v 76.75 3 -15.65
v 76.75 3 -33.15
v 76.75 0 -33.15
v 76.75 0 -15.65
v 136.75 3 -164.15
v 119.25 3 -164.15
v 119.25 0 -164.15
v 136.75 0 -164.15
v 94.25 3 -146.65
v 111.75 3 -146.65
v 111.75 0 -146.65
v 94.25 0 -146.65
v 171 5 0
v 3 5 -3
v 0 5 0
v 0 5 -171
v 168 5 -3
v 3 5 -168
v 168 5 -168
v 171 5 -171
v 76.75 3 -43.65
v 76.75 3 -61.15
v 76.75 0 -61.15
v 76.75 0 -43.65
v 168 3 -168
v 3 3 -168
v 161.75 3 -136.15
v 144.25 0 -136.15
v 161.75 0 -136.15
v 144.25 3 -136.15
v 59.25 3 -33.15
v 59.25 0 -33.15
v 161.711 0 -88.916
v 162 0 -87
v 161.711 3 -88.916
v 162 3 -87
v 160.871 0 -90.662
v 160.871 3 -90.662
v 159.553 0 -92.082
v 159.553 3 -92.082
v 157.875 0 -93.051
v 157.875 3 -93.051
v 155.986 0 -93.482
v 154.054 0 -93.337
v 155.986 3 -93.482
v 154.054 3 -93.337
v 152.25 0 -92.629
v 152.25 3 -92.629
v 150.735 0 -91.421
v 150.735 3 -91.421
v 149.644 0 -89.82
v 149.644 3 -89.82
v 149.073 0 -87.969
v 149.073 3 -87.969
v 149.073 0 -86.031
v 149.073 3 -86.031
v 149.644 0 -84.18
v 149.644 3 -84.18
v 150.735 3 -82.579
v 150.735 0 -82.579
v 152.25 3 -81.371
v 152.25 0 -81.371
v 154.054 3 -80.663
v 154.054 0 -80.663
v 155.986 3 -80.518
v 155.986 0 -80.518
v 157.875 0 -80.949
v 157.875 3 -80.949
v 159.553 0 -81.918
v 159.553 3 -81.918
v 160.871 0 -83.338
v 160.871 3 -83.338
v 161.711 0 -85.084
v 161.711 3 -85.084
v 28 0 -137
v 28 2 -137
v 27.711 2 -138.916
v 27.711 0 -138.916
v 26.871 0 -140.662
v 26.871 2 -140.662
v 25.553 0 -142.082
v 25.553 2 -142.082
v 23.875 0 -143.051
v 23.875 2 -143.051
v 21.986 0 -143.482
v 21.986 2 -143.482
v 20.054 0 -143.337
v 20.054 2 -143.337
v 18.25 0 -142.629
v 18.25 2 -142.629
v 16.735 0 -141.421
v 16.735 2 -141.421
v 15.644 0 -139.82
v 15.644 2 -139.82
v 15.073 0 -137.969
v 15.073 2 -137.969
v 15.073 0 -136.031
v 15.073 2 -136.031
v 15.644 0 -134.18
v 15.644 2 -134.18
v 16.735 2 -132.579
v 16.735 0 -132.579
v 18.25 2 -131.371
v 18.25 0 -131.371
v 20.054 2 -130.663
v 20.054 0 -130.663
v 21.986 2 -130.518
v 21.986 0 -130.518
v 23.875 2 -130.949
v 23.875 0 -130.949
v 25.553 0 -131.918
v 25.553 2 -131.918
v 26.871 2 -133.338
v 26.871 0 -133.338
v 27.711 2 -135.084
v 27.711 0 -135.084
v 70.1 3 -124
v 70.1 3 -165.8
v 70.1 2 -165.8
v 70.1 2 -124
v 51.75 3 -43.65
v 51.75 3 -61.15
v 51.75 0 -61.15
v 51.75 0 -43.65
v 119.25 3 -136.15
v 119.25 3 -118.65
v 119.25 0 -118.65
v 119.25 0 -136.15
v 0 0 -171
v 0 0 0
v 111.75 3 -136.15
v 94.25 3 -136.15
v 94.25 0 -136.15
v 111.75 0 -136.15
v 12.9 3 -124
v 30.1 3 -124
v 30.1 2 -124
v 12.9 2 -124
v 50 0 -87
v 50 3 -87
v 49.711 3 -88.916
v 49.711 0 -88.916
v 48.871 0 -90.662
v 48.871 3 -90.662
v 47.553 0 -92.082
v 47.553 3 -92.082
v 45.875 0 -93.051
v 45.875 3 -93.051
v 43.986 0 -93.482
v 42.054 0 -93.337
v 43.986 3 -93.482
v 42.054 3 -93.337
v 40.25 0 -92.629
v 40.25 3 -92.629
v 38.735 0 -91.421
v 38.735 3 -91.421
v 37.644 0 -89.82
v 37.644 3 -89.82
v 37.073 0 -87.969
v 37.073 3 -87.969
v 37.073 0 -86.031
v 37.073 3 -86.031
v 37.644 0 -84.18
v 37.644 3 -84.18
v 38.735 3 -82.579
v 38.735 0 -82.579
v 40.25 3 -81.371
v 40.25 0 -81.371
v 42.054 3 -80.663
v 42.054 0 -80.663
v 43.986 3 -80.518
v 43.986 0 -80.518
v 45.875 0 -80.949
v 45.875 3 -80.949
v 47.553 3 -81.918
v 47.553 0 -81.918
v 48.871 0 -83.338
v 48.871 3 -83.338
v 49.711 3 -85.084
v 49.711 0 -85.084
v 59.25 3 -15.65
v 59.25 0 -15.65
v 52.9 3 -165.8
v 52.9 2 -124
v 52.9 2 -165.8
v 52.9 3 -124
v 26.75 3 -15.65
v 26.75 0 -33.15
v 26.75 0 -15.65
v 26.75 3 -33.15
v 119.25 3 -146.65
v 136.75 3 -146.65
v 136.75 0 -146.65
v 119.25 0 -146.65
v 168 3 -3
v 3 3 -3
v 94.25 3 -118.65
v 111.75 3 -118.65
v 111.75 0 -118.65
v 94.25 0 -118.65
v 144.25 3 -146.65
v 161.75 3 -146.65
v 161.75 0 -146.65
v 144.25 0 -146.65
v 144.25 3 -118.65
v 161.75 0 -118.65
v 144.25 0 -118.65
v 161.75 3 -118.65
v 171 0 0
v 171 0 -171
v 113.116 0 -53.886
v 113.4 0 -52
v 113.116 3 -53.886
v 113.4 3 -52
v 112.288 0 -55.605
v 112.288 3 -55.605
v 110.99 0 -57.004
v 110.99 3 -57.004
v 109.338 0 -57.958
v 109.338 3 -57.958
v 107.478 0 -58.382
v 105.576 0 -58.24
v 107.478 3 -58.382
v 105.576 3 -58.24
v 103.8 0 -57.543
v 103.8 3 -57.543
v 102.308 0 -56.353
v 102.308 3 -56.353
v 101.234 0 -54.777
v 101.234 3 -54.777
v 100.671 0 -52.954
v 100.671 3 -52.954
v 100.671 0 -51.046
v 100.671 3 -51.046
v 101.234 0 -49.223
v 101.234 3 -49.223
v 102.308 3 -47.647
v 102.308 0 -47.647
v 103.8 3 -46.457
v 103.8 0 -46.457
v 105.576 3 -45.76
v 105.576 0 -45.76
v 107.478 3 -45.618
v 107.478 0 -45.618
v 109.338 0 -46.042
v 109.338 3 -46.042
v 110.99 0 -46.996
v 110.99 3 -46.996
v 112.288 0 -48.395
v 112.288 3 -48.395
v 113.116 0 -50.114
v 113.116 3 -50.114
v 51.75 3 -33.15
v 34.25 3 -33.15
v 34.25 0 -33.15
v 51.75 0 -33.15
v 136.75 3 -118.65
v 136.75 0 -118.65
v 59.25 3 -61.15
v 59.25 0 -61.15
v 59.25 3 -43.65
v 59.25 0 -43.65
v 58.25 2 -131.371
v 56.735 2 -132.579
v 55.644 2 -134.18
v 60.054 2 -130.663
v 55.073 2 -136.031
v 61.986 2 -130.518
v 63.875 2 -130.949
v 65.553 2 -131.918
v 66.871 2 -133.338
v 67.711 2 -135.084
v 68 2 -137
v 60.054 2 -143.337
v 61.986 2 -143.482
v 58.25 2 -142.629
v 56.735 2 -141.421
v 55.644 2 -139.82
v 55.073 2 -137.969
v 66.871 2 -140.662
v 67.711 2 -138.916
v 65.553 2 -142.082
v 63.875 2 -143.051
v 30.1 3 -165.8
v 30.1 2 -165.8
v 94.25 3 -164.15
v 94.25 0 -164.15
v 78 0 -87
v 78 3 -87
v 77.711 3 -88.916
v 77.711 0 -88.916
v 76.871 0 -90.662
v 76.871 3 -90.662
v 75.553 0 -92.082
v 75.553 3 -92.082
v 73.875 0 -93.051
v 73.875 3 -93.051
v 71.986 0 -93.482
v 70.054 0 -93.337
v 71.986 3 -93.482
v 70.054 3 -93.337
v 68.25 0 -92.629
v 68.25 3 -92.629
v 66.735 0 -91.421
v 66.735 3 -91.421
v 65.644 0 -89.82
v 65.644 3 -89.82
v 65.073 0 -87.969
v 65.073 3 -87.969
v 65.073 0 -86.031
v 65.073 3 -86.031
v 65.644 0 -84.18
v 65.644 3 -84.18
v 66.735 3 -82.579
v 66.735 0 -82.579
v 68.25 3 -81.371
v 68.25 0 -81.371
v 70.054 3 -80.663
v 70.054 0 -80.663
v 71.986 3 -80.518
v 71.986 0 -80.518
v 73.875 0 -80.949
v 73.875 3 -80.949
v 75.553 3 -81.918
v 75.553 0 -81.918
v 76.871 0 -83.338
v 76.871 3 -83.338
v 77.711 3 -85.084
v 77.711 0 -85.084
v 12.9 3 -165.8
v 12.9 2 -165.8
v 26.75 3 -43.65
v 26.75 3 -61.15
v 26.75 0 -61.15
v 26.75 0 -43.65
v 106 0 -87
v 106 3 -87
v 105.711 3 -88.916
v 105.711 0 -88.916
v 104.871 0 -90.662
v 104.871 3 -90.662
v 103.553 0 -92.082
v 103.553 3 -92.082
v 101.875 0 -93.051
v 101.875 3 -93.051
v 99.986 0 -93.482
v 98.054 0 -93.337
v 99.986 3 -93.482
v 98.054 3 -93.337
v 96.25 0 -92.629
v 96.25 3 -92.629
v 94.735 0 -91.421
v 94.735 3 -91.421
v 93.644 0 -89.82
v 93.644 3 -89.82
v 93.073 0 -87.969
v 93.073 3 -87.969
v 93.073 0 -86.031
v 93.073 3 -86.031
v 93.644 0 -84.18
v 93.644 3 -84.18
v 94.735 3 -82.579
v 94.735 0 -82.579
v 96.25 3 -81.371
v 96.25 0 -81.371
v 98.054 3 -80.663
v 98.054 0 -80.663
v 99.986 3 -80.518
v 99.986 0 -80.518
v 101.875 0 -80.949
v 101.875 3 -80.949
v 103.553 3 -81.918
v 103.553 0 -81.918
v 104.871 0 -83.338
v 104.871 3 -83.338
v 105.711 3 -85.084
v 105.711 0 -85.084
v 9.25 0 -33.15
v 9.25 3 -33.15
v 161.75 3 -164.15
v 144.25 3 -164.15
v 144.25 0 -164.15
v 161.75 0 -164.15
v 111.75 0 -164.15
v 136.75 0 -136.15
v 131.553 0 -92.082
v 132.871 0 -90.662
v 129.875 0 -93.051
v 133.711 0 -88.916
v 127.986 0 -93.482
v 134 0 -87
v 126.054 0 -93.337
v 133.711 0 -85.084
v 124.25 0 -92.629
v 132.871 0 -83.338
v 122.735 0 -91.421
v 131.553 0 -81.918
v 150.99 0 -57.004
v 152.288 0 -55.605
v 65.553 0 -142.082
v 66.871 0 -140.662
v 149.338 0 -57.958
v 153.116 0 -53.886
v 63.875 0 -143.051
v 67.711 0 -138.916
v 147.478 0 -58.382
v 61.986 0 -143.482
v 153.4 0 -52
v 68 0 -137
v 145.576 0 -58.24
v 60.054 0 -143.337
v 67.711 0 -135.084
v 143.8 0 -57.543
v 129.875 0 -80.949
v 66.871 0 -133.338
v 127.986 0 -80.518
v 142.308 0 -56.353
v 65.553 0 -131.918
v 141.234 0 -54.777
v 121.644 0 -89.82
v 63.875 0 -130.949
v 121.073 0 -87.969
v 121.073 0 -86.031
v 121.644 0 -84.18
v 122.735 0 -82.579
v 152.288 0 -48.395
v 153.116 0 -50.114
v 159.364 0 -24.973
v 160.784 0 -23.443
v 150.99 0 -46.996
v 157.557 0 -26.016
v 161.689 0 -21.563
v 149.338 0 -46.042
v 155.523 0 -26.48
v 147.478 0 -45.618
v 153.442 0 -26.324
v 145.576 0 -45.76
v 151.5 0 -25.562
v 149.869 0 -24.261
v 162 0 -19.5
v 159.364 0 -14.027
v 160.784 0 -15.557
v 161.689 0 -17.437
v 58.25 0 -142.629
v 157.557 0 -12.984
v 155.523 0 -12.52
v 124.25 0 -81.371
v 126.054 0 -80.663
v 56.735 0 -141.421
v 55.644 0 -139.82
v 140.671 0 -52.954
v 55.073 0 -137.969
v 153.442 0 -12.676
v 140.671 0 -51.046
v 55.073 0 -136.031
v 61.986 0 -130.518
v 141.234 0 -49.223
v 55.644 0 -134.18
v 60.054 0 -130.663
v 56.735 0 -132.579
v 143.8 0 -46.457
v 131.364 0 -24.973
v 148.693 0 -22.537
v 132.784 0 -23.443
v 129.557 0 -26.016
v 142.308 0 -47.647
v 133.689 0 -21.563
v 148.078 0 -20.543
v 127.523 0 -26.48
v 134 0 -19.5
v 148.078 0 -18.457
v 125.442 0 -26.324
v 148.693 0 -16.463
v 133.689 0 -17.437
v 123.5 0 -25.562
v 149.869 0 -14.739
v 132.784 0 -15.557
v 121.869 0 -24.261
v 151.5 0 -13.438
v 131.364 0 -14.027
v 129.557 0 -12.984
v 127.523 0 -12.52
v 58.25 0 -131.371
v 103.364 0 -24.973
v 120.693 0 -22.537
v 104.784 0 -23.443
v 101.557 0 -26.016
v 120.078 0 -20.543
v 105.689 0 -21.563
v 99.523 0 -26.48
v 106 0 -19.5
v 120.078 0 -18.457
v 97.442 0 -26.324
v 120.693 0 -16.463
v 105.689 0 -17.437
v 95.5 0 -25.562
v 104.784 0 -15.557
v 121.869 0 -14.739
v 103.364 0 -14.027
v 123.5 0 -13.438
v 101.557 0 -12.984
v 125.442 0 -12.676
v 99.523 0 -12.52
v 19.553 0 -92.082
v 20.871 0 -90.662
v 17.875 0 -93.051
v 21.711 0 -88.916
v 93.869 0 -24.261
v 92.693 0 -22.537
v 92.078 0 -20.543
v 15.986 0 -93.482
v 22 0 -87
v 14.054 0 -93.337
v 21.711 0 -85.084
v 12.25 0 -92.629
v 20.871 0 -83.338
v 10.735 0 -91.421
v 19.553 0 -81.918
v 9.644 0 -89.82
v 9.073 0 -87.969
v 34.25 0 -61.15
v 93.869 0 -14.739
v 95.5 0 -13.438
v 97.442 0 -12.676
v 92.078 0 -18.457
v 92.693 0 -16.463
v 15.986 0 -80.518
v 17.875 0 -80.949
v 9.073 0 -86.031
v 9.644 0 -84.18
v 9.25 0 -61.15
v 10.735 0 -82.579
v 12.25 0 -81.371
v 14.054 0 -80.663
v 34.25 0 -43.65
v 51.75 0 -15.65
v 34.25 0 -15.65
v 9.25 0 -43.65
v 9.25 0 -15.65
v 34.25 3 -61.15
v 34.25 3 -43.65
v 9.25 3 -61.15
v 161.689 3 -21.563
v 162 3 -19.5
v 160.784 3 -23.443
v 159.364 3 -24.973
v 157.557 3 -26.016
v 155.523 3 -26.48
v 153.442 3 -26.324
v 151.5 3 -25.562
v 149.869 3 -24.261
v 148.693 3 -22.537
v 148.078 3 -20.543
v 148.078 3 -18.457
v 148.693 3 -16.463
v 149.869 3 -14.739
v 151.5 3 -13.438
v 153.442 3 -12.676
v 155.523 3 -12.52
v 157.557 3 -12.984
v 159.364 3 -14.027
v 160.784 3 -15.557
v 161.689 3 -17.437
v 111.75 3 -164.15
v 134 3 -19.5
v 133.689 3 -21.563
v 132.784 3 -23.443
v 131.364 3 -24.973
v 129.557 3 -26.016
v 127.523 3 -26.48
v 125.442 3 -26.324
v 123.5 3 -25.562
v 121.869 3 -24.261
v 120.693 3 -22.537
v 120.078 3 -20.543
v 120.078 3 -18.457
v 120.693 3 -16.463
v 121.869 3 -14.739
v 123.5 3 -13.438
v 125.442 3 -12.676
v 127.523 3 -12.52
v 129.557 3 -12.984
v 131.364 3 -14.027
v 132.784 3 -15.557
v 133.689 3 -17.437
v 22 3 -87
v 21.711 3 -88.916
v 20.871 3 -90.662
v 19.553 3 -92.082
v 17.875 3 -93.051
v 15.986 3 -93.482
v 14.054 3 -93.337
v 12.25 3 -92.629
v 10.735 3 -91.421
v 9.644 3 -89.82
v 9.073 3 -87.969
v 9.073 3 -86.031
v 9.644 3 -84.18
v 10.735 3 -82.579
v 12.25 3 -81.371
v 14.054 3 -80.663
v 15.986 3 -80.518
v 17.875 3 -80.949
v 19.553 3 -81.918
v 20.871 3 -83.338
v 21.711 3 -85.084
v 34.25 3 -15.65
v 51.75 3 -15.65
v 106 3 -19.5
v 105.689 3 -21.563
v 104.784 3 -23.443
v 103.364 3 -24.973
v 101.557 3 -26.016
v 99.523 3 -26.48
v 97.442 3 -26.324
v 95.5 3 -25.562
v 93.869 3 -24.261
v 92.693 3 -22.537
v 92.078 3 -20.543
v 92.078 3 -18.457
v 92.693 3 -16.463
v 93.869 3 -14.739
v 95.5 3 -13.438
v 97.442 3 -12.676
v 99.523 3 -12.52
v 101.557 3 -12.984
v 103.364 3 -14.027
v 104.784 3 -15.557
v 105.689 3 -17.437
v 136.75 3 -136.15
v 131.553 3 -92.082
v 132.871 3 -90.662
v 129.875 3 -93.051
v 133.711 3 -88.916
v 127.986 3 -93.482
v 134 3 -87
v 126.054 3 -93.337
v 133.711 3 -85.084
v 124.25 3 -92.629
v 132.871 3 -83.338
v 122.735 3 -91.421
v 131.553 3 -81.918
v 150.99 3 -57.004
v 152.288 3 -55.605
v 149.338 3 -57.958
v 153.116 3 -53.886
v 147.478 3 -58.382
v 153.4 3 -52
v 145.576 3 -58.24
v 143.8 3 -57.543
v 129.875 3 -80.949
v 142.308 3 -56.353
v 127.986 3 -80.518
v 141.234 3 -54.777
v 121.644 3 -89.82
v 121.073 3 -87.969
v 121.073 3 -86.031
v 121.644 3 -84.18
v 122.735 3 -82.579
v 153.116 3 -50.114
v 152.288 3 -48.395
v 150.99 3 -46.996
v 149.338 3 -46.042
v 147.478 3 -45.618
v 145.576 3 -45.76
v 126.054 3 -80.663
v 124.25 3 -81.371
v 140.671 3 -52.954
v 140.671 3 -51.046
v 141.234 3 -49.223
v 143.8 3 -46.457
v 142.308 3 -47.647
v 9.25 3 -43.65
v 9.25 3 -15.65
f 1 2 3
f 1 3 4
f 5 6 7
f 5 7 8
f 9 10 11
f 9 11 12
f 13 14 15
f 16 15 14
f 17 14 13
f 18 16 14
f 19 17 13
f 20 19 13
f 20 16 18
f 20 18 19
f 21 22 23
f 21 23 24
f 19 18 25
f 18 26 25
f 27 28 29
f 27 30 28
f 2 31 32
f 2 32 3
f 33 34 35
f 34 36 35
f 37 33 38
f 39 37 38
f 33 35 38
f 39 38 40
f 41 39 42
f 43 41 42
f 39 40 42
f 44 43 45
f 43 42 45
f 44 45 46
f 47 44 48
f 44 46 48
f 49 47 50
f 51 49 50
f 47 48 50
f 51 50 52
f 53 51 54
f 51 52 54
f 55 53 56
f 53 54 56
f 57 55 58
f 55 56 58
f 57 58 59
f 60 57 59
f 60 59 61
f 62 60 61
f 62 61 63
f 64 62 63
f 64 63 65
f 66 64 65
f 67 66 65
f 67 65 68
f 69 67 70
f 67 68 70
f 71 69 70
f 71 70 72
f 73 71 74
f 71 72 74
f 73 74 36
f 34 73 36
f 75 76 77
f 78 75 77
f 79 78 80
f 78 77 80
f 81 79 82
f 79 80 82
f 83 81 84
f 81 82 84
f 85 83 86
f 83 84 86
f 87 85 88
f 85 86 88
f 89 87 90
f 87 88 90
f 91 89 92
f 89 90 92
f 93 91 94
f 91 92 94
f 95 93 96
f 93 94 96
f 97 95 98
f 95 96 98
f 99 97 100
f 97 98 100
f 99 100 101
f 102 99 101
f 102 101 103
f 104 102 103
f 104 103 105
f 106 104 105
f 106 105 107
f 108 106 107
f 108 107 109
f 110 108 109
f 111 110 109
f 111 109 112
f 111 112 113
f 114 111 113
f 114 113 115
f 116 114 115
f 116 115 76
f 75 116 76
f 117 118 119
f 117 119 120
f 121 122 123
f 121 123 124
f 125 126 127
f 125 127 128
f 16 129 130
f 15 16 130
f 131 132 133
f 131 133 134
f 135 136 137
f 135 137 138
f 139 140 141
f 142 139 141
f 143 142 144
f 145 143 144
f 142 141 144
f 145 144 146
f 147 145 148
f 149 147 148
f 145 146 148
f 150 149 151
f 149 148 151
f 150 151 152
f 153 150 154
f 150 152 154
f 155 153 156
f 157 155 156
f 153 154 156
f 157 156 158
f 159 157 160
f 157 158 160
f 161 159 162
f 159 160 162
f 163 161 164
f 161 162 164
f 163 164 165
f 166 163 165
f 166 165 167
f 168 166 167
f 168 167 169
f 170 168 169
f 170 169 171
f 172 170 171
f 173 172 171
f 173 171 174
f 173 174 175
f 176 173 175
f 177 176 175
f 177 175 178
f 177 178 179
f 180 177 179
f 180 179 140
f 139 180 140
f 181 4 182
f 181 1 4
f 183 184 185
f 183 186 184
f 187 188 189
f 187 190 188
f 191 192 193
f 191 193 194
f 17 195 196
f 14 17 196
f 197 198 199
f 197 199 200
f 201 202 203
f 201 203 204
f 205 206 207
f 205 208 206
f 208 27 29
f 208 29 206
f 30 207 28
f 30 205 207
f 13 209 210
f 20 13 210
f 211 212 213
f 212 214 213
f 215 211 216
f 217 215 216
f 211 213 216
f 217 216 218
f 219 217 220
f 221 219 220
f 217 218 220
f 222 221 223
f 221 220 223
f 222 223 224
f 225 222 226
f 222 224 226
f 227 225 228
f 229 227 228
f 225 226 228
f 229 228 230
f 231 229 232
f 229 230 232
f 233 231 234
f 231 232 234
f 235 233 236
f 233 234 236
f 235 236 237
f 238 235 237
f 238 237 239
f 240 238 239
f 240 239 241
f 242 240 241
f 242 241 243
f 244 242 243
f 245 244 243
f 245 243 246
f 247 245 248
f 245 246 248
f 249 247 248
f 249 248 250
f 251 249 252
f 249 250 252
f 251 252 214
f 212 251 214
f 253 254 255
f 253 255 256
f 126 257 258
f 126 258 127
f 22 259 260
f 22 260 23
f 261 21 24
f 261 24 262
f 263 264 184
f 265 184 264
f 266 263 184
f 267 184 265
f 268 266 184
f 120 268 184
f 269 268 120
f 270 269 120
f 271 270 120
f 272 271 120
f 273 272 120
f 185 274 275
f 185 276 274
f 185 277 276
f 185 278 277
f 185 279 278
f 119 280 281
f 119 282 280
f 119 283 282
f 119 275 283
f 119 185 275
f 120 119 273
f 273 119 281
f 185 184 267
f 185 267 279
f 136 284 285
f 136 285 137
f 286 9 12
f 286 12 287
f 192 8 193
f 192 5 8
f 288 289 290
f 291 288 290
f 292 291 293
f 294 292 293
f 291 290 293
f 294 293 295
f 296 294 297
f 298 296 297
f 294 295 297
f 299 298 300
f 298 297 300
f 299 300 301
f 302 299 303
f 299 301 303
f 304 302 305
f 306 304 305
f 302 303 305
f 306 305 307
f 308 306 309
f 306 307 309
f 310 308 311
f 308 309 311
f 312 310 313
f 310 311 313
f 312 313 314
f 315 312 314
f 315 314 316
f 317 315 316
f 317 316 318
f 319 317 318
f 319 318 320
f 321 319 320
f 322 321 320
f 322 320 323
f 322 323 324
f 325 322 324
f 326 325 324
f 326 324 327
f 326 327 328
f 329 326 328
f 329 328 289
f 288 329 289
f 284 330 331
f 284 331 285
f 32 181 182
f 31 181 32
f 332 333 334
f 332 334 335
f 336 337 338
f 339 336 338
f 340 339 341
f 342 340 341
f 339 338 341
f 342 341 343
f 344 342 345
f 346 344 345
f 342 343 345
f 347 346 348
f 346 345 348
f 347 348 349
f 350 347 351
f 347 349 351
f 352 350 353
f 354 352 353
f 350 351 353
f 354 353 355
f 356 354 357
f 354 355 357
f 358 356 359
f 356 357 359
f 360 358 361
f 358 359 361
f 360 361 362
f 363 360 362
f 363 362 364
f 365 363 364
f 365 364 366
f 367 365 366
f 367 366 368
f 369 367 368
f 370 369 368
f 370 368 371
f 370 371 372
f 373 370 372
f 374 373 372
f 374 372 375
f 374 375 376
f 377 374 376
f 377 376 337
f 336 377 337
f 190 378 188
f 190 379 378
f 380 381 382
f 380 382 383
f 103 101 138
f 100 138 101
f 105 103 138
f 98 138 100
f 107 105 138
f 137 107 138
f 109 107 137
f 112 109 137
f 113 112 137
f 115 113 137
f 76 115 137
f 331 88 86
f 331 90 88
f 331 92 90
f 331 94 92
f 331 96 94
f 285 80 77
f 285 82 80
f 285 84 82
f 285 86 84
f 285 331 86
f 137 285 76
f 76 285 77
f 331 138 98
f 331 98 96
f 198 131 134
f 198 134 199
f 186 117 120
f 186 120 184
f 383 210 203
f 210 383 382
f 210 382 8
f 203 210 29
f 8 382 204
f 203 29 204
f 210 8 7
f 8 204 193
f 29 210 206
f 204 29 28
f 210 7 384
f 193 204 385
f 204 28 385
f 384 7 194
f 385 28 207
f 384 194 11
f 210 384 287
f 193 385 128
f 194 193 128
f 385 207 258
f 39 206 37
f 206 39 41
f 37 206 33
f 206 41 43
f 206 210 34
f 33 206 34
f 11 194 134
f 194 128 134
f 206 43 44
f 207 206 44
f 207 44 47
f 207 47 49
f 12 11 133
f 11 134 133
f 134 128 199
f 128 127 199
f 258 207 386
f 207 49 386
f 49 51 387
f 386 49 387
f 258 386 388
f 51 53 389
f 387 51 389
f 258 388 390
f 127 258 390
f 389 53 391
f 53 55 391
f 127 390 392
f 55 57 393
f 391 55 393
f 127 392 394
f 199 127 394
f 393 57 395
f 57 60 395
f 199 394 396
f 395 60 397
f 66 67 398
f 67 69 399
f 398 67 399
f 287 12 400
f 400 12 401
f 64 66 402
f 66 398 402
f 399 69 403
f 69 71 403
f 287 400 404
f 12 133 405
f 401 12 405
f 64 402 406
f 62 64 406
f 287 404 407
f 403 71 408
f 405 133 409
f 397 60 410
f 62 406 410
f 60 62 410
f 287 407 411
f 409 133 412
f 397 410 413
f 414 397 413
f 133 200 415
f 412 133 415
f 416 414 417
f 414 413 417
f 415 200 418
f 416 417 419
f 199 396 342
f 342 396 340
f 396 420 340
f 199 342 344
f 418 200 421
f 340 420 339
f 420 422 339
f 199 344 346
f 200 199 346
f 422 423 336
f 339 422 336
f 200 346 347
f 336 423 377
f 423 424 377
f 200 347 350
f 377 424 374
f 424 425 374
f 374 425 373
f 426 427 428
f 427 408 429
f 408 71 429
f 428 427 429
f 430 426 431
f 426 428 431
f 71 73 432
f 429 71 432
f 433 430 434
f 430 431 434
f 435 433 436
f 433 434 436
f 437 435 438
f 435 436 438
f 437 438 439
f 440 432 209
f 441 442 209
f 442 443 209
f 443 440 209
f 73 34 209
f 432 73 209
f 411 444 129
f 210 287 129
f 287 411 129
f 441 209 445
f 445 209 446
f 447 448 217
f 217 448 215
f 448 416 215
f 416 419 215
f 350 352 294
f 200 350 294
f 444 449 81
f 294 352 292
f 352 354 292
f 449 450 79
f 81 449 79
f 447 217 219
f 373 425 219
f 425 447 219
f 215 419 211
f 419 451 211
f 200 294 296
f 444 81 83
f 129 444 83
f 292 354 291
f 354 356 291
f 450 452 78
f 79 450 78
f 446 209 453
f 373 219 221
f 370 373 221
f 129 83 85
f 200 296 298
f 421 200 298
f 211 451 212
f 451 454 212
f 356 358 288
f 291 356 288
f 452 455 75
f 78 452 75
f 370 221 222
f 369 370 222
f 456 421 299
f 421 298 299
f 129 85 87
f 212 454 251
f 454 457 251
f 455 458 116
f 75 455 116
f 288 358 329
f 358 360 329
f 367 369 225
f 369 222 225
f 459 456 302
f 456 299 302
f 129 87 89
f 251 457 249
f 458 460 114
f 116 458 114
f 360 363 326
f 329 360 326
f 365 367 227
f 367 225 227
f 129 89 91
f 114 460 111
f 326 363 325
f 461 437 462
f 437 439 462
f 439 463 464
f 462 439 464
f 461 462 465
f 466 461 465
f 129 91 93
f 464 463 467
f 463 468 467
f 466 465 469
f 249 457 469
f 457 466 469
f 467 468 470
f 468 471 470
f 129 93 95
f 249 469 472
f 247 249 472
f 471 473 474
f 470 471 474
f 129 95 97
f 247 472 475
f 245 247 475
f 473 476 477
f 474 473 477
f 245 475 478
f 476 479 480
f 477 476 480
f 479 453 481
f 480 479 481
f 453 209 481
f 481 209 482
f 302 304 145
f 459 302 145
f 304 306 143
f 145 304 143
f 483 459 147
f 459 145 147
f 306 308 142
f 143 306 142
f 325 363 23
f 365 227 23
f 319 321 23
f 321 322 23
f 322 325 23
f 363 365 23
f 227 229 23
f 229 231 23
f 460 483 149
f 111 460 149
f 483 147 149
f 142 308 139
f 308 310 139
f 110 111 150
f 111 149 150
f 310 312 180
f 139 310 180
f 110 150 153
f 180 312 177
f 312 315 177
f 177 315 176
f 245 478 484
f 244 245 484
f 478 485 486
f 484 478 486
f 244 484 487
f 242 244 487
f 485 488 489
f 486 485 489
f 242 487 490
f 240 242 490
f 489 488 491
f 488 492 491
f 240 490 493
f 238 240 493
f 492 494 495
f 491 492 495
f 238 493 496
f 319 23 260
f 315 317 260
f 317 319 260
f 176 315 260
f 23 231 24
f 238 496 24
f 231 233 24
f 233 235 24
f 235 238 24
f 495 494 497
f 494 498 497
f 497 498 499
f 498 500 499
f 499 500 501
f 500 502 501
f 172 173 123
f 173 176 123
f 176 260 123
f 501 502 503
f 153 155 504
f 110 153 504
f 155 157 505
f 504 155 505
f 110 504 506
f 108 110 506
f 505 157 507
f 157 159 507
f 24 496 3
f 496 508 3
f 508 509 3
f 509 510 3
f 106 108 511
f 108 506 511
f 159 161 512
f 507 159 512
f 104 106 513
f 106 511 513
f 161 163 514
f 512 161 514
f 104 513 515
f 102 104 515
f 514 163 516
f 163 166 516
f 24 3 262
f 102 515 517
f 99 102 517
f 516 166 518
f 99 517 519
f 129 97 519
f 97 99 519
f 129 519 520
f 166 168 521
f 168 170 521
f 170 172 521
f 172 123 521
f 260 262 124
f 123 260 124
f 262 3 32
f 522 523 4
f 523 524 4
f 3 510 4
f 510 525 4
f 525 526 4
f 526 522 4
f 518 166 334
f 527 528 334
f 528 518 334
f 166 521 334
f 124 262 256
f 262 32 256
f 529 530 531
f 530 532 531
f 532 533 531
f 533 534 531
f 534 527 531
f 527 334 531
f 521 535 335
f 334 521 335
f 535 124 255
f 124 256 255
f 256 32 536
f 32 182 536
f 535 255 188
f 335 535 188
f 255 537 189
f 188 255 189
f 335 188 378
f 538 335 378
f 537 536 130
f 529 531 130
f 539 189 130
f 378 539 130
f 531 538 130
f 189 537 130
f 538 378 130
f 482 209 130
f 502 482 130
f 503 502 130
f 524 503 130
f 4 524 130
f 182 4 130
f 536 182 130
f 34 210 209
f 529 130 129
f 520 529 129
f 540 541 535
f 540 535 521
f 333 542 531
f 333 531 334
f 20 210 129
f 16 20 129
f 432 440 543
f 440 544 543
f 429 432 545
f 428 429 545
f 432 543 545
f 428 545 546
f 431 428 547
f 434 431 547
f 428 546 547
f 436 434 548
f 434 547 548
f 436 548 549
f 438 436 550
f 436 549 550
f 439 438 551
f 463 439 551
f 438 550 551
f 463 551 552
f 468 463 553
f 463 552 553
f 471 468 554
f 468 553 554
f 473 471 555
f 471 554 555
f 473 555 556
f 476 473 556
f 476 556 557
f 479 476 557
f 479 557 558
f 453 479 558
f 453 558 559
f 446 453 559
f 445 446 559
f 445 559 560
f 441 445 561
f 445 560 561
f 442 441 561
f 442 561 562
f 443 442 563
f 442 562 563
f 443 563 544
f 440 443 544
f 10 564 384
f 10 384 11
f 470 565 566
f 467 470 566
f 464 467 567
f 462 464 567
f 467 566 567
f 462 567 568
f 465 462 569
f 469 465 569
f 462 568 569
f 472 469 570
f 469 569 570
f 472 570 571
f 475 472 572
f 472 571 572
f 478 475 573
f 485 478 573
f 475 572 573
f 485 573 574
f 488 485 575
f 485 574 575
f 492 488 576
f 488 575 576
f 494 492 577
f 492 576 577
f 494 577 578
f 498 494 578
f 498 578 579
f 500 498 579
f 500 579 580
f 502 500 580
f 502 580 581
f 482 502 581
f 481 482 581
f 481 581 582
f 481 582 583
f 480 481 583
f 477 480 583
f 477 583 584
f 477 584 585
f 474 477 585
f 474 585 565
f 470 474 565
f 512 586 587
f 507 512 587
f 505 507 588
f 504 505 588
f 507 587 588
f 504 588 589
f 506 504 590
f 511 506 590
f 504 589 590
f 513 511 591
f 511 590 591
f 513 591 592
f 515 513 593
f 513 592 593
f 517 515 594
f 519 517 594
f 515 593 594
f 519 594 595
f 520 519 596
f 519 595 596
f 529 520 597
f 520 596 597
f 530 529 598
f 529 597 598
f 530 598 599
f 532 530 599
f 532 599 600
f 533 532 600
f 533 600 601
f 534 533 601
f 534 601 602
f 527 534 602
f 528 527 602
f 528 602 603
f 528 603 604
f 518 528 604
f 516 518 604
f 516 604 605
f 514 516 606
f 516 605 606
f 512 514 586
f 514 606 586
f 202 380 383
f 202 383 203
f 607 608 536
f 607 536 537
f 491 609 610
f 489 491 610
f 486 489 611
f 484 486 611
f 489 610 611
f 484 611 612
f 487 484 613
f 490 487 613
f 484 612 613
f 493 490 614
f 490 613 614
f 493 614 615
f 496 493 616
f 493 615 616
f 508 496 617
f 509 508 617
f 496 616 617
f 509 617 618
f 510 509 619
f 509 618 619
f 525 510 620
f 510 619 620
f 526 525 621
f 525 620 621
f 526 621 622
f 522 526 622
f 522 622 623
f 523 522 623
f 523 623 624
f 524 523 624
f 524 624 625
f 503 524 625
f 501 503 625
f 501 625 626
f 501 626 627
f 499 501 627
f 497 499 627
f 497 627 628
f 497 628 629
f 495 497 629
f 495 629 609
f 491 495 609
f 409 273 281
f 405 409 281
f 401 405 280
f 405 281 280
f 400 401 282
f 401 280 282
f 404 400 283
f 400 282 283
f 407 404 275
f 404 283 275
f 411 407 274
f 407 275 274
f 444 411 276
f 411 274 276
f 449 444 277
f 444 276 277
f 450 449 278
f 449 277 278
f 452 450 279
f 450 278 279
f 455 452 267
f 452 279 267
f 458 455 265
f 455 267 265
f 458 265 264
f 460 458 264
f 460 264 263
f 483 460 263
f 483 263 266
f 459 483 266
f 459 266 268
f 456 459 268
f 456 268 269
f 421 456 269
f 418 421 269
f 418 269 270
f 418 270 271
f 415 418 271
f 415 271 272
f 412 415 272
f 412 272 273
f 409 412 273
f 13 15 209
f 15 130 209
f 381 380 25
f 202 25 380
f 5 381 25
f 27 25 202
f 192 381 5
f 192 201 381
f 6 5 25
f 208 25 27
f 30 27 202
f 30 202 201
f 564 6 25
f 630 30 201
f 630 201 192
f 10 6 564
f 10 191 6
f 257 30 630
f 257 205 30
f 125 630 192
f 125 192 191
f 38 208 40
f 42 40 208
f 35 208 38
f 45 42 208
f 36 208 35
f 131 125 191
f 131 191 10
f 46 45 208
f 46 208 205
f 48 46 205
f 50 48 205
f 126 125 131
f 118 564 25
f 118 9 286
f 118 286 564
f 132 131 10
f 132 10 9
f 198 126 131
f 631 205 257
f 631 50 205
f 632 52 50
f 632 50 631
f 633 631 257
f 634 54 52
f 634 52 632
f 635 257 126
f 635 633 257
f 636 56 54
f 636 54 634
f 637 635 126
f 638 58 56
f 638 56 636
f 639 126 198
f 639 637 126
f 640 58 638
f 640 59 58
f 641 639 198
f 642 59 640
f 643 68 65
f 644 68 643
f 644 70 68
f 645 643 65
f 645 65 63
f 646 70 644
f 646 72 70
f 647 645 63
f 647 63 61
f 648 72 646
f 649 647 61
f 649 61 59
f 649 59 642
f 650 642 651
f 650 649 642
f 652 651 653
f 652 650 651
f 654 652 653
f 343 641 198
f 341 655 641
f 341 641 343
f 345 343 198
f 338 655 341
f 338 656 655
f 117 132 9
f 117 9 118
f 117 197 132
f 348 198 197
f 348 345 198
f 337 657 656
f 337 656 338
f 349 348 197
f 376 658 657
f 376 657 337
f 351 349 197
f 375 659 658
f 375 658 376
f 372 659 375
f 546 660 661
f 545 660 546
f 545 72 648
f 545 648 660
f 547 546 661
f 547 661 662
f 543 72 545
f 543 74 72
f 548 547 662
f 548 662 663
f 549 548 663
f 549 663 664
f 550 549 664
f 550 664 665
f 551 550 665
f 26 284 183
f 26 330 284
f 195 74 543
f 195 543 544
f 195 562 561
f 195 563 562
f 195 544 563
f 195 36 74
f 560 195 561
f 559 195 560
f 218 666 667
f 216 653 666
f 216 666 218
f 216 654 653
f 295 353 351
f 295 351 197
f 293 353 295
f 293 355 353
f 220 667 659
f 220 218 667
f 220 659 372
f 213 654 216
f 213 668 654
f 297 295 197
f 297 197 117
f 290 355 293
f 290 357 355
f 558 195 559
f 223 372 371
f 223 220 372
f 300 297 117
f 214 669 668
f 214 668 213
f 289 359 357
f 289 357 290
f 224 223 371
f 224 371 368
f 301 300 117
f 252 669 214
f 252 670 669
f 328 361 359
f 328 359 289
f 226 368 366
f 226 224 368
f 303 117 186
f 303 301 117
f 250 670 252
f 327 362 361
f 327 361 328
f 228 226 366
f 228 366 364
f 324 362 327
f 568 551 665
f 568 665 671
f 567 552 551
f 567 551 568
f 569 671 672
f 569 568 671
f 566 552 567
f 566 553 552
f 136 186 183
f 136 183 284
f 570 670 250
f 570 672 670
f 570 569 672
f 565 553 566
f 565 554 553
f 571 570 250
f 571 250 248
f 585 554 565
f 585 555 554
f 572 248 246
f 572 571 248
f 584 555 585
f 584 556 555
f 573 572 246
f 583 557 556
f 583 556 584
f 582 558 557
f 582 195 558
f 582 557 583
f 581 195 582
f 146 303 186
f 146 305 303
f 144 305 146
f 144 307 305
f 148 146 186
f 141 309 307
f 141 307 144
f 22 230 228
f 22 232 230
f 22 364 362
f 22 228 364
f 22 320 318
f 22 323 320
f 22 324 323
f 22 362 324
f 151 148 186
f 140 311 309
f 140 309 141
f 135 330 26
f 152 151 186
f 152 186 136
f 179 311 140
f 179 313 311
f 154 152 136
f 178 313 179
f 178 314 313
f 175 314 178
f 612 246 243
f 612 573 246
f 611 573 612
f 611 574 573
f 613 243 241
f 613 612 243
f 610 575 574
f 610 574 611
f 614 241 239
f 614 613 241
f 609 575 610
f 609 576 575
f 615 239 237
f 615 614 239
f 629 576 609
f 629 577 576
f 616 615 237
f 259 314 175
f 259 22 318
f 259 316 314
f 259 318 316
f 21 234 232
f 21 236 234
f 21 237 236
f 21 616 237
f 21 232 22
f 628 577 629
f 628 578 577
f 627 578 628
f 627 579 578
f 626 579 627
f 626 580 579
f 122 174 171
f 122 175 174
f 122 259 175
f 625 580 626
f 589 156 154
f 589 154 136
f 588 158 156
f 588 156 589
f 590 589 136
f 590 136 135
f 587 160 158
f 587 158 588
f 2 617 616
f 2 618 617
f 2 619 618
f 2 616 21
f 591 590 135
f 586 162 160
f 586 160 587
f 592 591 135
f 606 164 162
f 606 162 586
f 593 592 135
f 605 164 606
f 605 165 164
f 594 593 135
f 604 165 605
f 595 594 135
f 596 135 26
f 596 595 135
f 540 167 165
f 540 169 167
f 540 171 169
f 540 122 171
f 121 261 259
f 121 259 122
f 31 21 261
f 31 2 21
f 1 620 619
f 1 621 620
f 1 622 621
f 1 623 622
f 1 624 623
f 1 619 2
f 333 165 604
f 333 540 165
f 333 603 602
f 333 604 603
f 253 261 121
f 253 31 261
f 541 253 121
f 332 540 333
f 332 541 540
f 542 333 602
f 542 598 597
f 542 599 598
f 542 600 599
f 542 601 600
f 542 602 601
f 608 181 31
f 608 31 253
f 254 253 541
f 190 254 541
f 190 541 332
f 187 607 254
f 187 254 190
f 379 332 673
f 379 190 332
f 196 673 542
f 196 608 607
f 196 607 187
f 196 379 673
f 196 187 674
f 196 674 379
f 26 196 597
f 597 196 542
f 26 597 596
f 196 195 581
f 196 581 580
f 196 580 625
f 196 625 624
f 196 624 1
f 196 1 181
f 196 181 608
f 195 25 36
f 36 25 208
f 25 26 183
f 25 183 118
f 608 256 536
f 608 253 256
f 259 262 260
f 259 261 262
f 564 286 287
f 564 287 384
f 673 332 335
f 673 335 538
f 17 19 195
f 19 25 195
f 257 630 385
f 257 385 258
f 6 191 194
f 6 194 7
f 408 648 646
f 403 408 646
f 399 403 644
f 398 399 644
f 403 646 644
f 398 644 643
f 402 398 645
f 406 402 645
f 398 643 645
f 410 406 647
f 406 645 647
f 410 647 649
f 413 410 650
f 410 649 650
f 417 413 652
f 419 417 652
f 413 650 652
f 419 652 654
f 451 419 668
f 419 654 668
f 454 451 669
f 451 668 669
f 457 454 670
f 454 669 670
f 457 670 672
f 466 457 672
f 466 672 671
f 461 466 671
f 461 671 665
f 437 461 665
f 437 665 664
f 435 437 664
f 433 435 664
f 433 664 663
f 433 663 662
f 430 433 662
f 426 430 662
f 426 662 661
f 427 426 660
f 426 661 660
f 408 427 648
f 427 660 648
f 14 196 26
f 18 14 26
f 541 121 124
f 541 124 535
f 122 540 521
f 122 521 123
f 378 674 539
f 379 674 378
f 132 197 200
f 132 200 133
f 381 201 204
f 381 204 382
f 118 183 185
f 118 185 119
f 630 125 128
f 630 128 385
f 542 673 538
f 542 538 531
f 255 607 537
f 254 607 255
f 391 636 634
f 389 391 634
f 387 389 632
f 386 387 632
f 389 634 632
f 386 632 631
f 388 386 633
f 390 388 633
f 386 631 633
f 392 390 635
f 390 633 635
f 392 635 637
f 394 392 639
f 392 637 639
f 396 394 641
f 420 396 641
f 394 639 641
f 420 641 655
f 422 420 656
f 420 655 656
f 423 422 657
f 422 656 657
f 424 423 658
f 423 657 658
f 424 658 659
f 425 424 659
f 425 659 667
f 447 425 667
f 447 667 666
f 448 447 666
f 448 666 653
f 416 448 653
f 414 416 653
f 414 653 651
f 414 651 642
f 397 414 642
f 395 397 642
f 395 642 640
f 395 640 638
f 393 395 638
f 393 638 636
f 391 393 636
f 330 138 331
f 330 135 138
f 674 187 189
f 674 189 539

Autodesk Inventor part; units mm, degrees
ref_plane "YZ Plane" through (0, 0, 0) normal (1, 0, 0) x (0, 1, 0)
ref_plane "XZ Plane" through (0, 0, 0) normal (0, 1, 0) x (-1, 0, 0)
ref_plane "XY Plane" through (0, 0, 0) normal (0, 0, 1) x (1, 0, 0)
sketch "Sketch1" plane through (0, 0, 0) normal (0, 1, 0) x (-1, 0, 0)
  line L0 (0, 0) -> (-171, 0)
  line L1 (-171, 0) -> (-171, -171)
  line L2 (-171, -171) -> (0, -171)
  line L3 (0, -171) -> (0, 0)
  dimension "d0" = 171
  dimension "d1" = 171
extrude "Extrusion1" add sketch "Sketch1" along normal blind 3
sketch "Sketch2" plane through (0, 3, 0) normal (0, 1, 0) x (1, 0, 0)
  line L0 (171, 0) -> (171, 171) projected
  line L1 (171, 171) -> (0, 171) projected
  line L2 (0, 171) -> (0, 0) projected
  line L3 (0, 0) -> (171, 0) projected
  line L4 (3, 3) -> (3, 168)
  line L5 (3, 168) -> (168, 168)
  line L6 (168, 168) -> (168, 3)
  line L7 (168, 3) -> (3, 3)
  dimension "d98" = 165
extrude "Extrusion2" add sketch "Sketch2" along normal blind 2
sketch "Sketch3" plane through (0, 3, 0) normal (0, 1, 0) x (1, 0, 0)
  line L0 (3, 3) -> (168, 3) construction
  line L1 (168, 3) -> (168, 168) construction
  line L2 (168, 168) -> (3, 168) construction
  line L3 (3, 168) -> (3, 3) construction
  line L4 (4, 64) -> (82, 64) construction
  line L5 (82, 64) -> (82, 4) construction
  line L6 (82, 4) -> (4, 4) construction
  line L7 (4, 4) -> (4, 64) construction
  line L8 (89, 107) -> (167, 107) construction
  line L9 (167, 107) -> (167, 167) construction
  line L10 (167, 167) -> (89, 167) construction
  line L11 (89, 167) -> (89, 107) construction
  line L12 (4, 167) -> (79, 167) construction
  line L13 (79, 167) -> (79, 102) construction
  line L14 (4, 72) -> (4, 167) construction
  line L15 (4, 72) -> (167, 72) construction
  line L16 (167, 72) -> (167, 102) construction
  line L17 (167, 102) -> (79, 102) construction
  line L18 (87, 67) -> (167, 67) construction
  line L19 (167, 67) -> (167, 37) construction
  line L20 (167, 37) -> (87, 37) construction
  line L21 (87, 37) -> (87, 67) construction
  line L22 (87, 32) -> (167, 32) construction
  line L23 (167, 32) -> (167, 7) construction
  line L24 (167, 7) -> (87, 7) construction
  line L25 (87, 7) -> (87, 32) construction
  line L26 (9.25, 33.15) -> (26.75, 33.15)
  line L27 (26.75, 33.15) -> (26.75, 15.65)
  line L28 (26.75, 15.65) -> (9.25, 15.65)
  line L29 (9.25, 15.65) -> (9.25, 33.15)
  line L30 (9.25, 61.15) -> (26.75, 61.15)
  line L31 (9.25, 43.65) -> (9.25, 61.15)
  line L32 (26.75, 43.65) -> (9.25, 43.65)
  line L33 (26.75, 61.15) -> (26.75, 43.65)
  line L34 (34.25, 33.15) -> (51.75, 33.15)
  line L35 (34.25, 15.65) -> (34.25, 33.15)
  line L36 (51.75, 15.65) -> (34.25, 15.65)
  line L37 (51.75, 33.15) -> (51.75, 15.65)
  line L38 (34.25, 61.15) -> (51.75, 61.15)
  line L39 (34.25, 43.65) -> (34.25, 61.15)
  line L40 (51.75, 43.65) -> (34.25, 43.65)
  line L41 (51.75, 61.15) -> (51.75, 43.65)
  line L42 (59.25, 33.15) -> (76.75, 33.15)
  line L43 (59.25, 15.65) -> (59.25, 33.15)
  line L44 (76.75, 15.65) -> (59.25, 15.65)
  line L45 (76.75, 33.15) -> (76.75, 15.65)
  line L46 (59.25, 61.15) -> (76.75, 61.15)
  line L47 (59.25, 43.65) -> (59.25, 61.15)
  line L48 (76.75, 43.65) -> (59.25, 43.65)
  line L49 (76.75, 61.15) -> (76.75, 43.65)
  line L50 (9.25, 61.15) -> (9.25, 15.65) construction
  line L51 (9.25, 61.15) -> (76.75, 61.15) construction
  line L52 (94.25, 136.15) -> (111.75, 136.15)
  line L53 (111.75, 136.15) -> (111.75, 118.65)
  line L54 (111.75, 118.65) -> (94.25, 118.65)
  line L55 (94.25, 118.65) -> (94.25, 136.15)
  line L56 (94.25, 164.15) -> (111.75, 164.15)
  line L57 (94.25, 146.65) -> (94.25, 164.15)
  line L58 (111.75, 146.65) -> (94.25, 146.65)
  line L59 (111.75, 164.15) -> (111.75, 146.65)
  line L60 (119.25, 136.15) -> (136.75, 136.15)
  line L61 (119.25, 118.65) -> (119.25, 136.15)
  line L62 (136.75, 118.65) -> (119.25, 118.65)
  line L63 (136.75, 136.15) -> (136.75, 118.65)
  line L64 (119.25, 164.15) -> (136.75, 164.15)
  line L65 (119.25, 146.65) -> (119.25, 164.15)
  line L66 (136.75, 146.65) -> (119.25, 146.65)
  line L67 (136.75, 164.15) -> (136.75, 146.65)
  line L68 (144.25, 136.15) -> (161.75, 136.15)
  line L69 (144.25, 118.65) -> (144.25, 136.15)
  line L70 (161.75, 118.65) -> (144.25, 118.65)
  line L71 (161.75, 136.15) -> (161.75, 118.65)
  line L72 (144.25, 164.15) -> (161.75, 164.15)
  line L73 (144.25, 146.65) -> (144.25, 164.15)
  line L74 (161.75, 146.65) -> (144.25, 146.65)
  line L75 (161.75, 164.15) -> (161.75, 146.65)
  line L76 (94.25, 164.15) -> (94.25, 118.65) construction
  line L77 (94.25, 164.15) -> (161.75, 164.15) construction
  circle A0 centre (107, 52) radius 12.5 construction
  circle A1 centre (147, 52) radius 12.5 construction
  circle A2 centre (107, 52) radius 6.4
  circle A3 centre (147, 52) radius 6.4
  circle A4 centre (99, 19.5) radius 8.1 construction
  circle A5 centre (127, 19.5) radius 8.1 construction
  circle A6 centre (155, 19.5) radius 8.1 construction
  circle A7 centre (99, 19.5) radius 7
  circle A8 centre (127, 19.5) radius 7
  circle A9 centre (155, 19.5) radius 7
  circle A10 centre (155.5, 87) radius 6.5
  circle A11 centre (127.5, 87) radius 6.5
  circle A12 centre (99.5, 87) radius 6.5
  circle A13 centre (71.5, 87) radius 6.5
  circle A14 centre (43.5, 87) radius 6.5
  circle A15 centre (15.5, 87) radius 6.5
  circle A16 centre (61.5, 137) radius 6.5
  circle A17 centre (21.5, 137) radius 6.5
  point P0 (0, 0)
  point P1 (4, 34)
  point P2 (43, 61.15)
  point P3 (43, 64)
  point P4 (18, 43.65)
  point P5 (26.75, 52.4)
  point P6 (128, 164.15)
  point P7 (103, 146.65)
  point P8 (111.75, 155.4)
  point P9 (128, 164.15)
  point P10 (128, 107)
  point P11 (87, 52)
  point P12 (167, 19.5)
  point P13 (167, 87)
  point P14 (79, 134.5)
  point P15 (9.25, 24.4)
  point P16 (94.25, 127.4)
  dimension "d7" = 1
  dimension "d8" = 1
  dimension "d9" = 60
  dimension "d10" = 78
  dimension "d11" = 78
  dimension "d12" = 60
  dimension "d13" = 1
  dimension "d14" = 1
  dimension "d15" = 1
  dimension "d16" = 1
  dimension "d17" = 75
  dimension "d19" = 1
  dimension "d20" = 5
  dimension "d21" = 30
  dimension "d22" = 5
  dimension "d23" = 5
  dimension "d24" = 1
  dimension "d27" = 5
  dimension "d28" = 5
  dimension "d29" = 1
  dimension "d30" = 4
  dimension "d31" = 25
  dimension "d32" = 17.5
  dimension "d33" = 17.5
  dimension "d37" = 28
  dimension "d40" = 25
  dimension "d44" = 5.25
  dimension "d45" = 2.85
  dimension "d46" = 14
  dimension "d47" = 11.6
  dimension "d52" = 17.5
  dimension "d53" = 17.5
  dimension "d54" = 28
  dimension "d55" = 25
  dimension "d57" = 30
  dimension "d58" = 80
  dimension "d59" = 25
  dimension "d60" = 25
  dimension "d61" = 20
  dimension "d62" = 40
  dimension "d63" = 12.8
  dimension "d64" = 12.8
  dimension "d67" = 80
  dimension "d68" = 16.2
  dimension "d69" = 16.2
  dimension "d70" = 16.2
  dimension "d71" = 28
  dimension "d72" = 28
  dimension "d73" = 12
  dimension "d74" = 14
  dimension "d75" = 14
  dimension "d76" = 14
  dimension "d77" = 13
  dimension "d80" = 28
  dimension "d85" = 11.5
  dimension "d86" = 163
  dimension "d87" = 65
  dimension "d88" = 95
  dimension "d89" = 88
  dimension "d90" = 13
  dimension "d91" = 13
  dimension "d92" = 30
  dimension "d93" = 40
  dimension "d94" = 17.5
extrude "Extrusion3" cut sketch "Sketch3" against normal up to surface (3 mm away)
sketch "Sketch5" plane through (0, 3, 0) normal (0, 1, 0) x (1, 0, 0)
  circle A0 centre (21.5, 137) radius 6.5 construction
  circle A1 centre (61.5, 137) radius 6.5 construction
  line L0 (12.9, 165.8) -> (30.1, 165.8)
  line L1 (30.1, 165.8) -> (30.1, 124)
  line L2 (30.1, 124) -> (12.9, 124)
  line L3 (12.9, 124) -> (12.9, 165.8)
  line L4 (70.1, 124) -> (52.9, 124)
  line L5 (52.9, 124) -> (52.9, 165.8)
  line L6 (52.9, 165.8) -> (70.1, 165.8)
  line L7 (70.1, 165.8) -> (70.1, 124)
  point P0 (0, 0)
  point P1 (21.5, 165.8)
  point P2 (61.5, 165.8)
  point P3 (61.5, 124)
  point P4 (21.5, 124)
  dimension "d99" = 13
  dimension "d100" = 28.8
  dimension "d101" = 17.2
  dimension "d102" = 17.2
extrude "Extrusion5" cut sketch "Sketch5" against normal blind 1
equation "\"d8\" = d7"
equation "\"d11\" = d10"
equation "\"d12\" = d9"
equation "\"d13\" = d7"
equation "\"d14\" = d7"
equation "\"d15\" = d7"
equation "\"d16\" = d7"
equation "\"d19\" = d7"
equation "\"d24\" = d7"
equation "\"d29\" = d7"
equation "\"d60\" = d59"
equation "\"d61\" = -0.5 * d62 + 0.5 * d58"
equation "\"d64\" = d63"
equation "\"d69\" = d68"
equation "\"d70\" = d68"
equation "\"d72\" = d71"
equation "\"d73\" = -d71 + 0.5 * d67"
equation "\"d75\" = d74"
equation "\"d76\" = d74"
properties part number "Faceplate"
